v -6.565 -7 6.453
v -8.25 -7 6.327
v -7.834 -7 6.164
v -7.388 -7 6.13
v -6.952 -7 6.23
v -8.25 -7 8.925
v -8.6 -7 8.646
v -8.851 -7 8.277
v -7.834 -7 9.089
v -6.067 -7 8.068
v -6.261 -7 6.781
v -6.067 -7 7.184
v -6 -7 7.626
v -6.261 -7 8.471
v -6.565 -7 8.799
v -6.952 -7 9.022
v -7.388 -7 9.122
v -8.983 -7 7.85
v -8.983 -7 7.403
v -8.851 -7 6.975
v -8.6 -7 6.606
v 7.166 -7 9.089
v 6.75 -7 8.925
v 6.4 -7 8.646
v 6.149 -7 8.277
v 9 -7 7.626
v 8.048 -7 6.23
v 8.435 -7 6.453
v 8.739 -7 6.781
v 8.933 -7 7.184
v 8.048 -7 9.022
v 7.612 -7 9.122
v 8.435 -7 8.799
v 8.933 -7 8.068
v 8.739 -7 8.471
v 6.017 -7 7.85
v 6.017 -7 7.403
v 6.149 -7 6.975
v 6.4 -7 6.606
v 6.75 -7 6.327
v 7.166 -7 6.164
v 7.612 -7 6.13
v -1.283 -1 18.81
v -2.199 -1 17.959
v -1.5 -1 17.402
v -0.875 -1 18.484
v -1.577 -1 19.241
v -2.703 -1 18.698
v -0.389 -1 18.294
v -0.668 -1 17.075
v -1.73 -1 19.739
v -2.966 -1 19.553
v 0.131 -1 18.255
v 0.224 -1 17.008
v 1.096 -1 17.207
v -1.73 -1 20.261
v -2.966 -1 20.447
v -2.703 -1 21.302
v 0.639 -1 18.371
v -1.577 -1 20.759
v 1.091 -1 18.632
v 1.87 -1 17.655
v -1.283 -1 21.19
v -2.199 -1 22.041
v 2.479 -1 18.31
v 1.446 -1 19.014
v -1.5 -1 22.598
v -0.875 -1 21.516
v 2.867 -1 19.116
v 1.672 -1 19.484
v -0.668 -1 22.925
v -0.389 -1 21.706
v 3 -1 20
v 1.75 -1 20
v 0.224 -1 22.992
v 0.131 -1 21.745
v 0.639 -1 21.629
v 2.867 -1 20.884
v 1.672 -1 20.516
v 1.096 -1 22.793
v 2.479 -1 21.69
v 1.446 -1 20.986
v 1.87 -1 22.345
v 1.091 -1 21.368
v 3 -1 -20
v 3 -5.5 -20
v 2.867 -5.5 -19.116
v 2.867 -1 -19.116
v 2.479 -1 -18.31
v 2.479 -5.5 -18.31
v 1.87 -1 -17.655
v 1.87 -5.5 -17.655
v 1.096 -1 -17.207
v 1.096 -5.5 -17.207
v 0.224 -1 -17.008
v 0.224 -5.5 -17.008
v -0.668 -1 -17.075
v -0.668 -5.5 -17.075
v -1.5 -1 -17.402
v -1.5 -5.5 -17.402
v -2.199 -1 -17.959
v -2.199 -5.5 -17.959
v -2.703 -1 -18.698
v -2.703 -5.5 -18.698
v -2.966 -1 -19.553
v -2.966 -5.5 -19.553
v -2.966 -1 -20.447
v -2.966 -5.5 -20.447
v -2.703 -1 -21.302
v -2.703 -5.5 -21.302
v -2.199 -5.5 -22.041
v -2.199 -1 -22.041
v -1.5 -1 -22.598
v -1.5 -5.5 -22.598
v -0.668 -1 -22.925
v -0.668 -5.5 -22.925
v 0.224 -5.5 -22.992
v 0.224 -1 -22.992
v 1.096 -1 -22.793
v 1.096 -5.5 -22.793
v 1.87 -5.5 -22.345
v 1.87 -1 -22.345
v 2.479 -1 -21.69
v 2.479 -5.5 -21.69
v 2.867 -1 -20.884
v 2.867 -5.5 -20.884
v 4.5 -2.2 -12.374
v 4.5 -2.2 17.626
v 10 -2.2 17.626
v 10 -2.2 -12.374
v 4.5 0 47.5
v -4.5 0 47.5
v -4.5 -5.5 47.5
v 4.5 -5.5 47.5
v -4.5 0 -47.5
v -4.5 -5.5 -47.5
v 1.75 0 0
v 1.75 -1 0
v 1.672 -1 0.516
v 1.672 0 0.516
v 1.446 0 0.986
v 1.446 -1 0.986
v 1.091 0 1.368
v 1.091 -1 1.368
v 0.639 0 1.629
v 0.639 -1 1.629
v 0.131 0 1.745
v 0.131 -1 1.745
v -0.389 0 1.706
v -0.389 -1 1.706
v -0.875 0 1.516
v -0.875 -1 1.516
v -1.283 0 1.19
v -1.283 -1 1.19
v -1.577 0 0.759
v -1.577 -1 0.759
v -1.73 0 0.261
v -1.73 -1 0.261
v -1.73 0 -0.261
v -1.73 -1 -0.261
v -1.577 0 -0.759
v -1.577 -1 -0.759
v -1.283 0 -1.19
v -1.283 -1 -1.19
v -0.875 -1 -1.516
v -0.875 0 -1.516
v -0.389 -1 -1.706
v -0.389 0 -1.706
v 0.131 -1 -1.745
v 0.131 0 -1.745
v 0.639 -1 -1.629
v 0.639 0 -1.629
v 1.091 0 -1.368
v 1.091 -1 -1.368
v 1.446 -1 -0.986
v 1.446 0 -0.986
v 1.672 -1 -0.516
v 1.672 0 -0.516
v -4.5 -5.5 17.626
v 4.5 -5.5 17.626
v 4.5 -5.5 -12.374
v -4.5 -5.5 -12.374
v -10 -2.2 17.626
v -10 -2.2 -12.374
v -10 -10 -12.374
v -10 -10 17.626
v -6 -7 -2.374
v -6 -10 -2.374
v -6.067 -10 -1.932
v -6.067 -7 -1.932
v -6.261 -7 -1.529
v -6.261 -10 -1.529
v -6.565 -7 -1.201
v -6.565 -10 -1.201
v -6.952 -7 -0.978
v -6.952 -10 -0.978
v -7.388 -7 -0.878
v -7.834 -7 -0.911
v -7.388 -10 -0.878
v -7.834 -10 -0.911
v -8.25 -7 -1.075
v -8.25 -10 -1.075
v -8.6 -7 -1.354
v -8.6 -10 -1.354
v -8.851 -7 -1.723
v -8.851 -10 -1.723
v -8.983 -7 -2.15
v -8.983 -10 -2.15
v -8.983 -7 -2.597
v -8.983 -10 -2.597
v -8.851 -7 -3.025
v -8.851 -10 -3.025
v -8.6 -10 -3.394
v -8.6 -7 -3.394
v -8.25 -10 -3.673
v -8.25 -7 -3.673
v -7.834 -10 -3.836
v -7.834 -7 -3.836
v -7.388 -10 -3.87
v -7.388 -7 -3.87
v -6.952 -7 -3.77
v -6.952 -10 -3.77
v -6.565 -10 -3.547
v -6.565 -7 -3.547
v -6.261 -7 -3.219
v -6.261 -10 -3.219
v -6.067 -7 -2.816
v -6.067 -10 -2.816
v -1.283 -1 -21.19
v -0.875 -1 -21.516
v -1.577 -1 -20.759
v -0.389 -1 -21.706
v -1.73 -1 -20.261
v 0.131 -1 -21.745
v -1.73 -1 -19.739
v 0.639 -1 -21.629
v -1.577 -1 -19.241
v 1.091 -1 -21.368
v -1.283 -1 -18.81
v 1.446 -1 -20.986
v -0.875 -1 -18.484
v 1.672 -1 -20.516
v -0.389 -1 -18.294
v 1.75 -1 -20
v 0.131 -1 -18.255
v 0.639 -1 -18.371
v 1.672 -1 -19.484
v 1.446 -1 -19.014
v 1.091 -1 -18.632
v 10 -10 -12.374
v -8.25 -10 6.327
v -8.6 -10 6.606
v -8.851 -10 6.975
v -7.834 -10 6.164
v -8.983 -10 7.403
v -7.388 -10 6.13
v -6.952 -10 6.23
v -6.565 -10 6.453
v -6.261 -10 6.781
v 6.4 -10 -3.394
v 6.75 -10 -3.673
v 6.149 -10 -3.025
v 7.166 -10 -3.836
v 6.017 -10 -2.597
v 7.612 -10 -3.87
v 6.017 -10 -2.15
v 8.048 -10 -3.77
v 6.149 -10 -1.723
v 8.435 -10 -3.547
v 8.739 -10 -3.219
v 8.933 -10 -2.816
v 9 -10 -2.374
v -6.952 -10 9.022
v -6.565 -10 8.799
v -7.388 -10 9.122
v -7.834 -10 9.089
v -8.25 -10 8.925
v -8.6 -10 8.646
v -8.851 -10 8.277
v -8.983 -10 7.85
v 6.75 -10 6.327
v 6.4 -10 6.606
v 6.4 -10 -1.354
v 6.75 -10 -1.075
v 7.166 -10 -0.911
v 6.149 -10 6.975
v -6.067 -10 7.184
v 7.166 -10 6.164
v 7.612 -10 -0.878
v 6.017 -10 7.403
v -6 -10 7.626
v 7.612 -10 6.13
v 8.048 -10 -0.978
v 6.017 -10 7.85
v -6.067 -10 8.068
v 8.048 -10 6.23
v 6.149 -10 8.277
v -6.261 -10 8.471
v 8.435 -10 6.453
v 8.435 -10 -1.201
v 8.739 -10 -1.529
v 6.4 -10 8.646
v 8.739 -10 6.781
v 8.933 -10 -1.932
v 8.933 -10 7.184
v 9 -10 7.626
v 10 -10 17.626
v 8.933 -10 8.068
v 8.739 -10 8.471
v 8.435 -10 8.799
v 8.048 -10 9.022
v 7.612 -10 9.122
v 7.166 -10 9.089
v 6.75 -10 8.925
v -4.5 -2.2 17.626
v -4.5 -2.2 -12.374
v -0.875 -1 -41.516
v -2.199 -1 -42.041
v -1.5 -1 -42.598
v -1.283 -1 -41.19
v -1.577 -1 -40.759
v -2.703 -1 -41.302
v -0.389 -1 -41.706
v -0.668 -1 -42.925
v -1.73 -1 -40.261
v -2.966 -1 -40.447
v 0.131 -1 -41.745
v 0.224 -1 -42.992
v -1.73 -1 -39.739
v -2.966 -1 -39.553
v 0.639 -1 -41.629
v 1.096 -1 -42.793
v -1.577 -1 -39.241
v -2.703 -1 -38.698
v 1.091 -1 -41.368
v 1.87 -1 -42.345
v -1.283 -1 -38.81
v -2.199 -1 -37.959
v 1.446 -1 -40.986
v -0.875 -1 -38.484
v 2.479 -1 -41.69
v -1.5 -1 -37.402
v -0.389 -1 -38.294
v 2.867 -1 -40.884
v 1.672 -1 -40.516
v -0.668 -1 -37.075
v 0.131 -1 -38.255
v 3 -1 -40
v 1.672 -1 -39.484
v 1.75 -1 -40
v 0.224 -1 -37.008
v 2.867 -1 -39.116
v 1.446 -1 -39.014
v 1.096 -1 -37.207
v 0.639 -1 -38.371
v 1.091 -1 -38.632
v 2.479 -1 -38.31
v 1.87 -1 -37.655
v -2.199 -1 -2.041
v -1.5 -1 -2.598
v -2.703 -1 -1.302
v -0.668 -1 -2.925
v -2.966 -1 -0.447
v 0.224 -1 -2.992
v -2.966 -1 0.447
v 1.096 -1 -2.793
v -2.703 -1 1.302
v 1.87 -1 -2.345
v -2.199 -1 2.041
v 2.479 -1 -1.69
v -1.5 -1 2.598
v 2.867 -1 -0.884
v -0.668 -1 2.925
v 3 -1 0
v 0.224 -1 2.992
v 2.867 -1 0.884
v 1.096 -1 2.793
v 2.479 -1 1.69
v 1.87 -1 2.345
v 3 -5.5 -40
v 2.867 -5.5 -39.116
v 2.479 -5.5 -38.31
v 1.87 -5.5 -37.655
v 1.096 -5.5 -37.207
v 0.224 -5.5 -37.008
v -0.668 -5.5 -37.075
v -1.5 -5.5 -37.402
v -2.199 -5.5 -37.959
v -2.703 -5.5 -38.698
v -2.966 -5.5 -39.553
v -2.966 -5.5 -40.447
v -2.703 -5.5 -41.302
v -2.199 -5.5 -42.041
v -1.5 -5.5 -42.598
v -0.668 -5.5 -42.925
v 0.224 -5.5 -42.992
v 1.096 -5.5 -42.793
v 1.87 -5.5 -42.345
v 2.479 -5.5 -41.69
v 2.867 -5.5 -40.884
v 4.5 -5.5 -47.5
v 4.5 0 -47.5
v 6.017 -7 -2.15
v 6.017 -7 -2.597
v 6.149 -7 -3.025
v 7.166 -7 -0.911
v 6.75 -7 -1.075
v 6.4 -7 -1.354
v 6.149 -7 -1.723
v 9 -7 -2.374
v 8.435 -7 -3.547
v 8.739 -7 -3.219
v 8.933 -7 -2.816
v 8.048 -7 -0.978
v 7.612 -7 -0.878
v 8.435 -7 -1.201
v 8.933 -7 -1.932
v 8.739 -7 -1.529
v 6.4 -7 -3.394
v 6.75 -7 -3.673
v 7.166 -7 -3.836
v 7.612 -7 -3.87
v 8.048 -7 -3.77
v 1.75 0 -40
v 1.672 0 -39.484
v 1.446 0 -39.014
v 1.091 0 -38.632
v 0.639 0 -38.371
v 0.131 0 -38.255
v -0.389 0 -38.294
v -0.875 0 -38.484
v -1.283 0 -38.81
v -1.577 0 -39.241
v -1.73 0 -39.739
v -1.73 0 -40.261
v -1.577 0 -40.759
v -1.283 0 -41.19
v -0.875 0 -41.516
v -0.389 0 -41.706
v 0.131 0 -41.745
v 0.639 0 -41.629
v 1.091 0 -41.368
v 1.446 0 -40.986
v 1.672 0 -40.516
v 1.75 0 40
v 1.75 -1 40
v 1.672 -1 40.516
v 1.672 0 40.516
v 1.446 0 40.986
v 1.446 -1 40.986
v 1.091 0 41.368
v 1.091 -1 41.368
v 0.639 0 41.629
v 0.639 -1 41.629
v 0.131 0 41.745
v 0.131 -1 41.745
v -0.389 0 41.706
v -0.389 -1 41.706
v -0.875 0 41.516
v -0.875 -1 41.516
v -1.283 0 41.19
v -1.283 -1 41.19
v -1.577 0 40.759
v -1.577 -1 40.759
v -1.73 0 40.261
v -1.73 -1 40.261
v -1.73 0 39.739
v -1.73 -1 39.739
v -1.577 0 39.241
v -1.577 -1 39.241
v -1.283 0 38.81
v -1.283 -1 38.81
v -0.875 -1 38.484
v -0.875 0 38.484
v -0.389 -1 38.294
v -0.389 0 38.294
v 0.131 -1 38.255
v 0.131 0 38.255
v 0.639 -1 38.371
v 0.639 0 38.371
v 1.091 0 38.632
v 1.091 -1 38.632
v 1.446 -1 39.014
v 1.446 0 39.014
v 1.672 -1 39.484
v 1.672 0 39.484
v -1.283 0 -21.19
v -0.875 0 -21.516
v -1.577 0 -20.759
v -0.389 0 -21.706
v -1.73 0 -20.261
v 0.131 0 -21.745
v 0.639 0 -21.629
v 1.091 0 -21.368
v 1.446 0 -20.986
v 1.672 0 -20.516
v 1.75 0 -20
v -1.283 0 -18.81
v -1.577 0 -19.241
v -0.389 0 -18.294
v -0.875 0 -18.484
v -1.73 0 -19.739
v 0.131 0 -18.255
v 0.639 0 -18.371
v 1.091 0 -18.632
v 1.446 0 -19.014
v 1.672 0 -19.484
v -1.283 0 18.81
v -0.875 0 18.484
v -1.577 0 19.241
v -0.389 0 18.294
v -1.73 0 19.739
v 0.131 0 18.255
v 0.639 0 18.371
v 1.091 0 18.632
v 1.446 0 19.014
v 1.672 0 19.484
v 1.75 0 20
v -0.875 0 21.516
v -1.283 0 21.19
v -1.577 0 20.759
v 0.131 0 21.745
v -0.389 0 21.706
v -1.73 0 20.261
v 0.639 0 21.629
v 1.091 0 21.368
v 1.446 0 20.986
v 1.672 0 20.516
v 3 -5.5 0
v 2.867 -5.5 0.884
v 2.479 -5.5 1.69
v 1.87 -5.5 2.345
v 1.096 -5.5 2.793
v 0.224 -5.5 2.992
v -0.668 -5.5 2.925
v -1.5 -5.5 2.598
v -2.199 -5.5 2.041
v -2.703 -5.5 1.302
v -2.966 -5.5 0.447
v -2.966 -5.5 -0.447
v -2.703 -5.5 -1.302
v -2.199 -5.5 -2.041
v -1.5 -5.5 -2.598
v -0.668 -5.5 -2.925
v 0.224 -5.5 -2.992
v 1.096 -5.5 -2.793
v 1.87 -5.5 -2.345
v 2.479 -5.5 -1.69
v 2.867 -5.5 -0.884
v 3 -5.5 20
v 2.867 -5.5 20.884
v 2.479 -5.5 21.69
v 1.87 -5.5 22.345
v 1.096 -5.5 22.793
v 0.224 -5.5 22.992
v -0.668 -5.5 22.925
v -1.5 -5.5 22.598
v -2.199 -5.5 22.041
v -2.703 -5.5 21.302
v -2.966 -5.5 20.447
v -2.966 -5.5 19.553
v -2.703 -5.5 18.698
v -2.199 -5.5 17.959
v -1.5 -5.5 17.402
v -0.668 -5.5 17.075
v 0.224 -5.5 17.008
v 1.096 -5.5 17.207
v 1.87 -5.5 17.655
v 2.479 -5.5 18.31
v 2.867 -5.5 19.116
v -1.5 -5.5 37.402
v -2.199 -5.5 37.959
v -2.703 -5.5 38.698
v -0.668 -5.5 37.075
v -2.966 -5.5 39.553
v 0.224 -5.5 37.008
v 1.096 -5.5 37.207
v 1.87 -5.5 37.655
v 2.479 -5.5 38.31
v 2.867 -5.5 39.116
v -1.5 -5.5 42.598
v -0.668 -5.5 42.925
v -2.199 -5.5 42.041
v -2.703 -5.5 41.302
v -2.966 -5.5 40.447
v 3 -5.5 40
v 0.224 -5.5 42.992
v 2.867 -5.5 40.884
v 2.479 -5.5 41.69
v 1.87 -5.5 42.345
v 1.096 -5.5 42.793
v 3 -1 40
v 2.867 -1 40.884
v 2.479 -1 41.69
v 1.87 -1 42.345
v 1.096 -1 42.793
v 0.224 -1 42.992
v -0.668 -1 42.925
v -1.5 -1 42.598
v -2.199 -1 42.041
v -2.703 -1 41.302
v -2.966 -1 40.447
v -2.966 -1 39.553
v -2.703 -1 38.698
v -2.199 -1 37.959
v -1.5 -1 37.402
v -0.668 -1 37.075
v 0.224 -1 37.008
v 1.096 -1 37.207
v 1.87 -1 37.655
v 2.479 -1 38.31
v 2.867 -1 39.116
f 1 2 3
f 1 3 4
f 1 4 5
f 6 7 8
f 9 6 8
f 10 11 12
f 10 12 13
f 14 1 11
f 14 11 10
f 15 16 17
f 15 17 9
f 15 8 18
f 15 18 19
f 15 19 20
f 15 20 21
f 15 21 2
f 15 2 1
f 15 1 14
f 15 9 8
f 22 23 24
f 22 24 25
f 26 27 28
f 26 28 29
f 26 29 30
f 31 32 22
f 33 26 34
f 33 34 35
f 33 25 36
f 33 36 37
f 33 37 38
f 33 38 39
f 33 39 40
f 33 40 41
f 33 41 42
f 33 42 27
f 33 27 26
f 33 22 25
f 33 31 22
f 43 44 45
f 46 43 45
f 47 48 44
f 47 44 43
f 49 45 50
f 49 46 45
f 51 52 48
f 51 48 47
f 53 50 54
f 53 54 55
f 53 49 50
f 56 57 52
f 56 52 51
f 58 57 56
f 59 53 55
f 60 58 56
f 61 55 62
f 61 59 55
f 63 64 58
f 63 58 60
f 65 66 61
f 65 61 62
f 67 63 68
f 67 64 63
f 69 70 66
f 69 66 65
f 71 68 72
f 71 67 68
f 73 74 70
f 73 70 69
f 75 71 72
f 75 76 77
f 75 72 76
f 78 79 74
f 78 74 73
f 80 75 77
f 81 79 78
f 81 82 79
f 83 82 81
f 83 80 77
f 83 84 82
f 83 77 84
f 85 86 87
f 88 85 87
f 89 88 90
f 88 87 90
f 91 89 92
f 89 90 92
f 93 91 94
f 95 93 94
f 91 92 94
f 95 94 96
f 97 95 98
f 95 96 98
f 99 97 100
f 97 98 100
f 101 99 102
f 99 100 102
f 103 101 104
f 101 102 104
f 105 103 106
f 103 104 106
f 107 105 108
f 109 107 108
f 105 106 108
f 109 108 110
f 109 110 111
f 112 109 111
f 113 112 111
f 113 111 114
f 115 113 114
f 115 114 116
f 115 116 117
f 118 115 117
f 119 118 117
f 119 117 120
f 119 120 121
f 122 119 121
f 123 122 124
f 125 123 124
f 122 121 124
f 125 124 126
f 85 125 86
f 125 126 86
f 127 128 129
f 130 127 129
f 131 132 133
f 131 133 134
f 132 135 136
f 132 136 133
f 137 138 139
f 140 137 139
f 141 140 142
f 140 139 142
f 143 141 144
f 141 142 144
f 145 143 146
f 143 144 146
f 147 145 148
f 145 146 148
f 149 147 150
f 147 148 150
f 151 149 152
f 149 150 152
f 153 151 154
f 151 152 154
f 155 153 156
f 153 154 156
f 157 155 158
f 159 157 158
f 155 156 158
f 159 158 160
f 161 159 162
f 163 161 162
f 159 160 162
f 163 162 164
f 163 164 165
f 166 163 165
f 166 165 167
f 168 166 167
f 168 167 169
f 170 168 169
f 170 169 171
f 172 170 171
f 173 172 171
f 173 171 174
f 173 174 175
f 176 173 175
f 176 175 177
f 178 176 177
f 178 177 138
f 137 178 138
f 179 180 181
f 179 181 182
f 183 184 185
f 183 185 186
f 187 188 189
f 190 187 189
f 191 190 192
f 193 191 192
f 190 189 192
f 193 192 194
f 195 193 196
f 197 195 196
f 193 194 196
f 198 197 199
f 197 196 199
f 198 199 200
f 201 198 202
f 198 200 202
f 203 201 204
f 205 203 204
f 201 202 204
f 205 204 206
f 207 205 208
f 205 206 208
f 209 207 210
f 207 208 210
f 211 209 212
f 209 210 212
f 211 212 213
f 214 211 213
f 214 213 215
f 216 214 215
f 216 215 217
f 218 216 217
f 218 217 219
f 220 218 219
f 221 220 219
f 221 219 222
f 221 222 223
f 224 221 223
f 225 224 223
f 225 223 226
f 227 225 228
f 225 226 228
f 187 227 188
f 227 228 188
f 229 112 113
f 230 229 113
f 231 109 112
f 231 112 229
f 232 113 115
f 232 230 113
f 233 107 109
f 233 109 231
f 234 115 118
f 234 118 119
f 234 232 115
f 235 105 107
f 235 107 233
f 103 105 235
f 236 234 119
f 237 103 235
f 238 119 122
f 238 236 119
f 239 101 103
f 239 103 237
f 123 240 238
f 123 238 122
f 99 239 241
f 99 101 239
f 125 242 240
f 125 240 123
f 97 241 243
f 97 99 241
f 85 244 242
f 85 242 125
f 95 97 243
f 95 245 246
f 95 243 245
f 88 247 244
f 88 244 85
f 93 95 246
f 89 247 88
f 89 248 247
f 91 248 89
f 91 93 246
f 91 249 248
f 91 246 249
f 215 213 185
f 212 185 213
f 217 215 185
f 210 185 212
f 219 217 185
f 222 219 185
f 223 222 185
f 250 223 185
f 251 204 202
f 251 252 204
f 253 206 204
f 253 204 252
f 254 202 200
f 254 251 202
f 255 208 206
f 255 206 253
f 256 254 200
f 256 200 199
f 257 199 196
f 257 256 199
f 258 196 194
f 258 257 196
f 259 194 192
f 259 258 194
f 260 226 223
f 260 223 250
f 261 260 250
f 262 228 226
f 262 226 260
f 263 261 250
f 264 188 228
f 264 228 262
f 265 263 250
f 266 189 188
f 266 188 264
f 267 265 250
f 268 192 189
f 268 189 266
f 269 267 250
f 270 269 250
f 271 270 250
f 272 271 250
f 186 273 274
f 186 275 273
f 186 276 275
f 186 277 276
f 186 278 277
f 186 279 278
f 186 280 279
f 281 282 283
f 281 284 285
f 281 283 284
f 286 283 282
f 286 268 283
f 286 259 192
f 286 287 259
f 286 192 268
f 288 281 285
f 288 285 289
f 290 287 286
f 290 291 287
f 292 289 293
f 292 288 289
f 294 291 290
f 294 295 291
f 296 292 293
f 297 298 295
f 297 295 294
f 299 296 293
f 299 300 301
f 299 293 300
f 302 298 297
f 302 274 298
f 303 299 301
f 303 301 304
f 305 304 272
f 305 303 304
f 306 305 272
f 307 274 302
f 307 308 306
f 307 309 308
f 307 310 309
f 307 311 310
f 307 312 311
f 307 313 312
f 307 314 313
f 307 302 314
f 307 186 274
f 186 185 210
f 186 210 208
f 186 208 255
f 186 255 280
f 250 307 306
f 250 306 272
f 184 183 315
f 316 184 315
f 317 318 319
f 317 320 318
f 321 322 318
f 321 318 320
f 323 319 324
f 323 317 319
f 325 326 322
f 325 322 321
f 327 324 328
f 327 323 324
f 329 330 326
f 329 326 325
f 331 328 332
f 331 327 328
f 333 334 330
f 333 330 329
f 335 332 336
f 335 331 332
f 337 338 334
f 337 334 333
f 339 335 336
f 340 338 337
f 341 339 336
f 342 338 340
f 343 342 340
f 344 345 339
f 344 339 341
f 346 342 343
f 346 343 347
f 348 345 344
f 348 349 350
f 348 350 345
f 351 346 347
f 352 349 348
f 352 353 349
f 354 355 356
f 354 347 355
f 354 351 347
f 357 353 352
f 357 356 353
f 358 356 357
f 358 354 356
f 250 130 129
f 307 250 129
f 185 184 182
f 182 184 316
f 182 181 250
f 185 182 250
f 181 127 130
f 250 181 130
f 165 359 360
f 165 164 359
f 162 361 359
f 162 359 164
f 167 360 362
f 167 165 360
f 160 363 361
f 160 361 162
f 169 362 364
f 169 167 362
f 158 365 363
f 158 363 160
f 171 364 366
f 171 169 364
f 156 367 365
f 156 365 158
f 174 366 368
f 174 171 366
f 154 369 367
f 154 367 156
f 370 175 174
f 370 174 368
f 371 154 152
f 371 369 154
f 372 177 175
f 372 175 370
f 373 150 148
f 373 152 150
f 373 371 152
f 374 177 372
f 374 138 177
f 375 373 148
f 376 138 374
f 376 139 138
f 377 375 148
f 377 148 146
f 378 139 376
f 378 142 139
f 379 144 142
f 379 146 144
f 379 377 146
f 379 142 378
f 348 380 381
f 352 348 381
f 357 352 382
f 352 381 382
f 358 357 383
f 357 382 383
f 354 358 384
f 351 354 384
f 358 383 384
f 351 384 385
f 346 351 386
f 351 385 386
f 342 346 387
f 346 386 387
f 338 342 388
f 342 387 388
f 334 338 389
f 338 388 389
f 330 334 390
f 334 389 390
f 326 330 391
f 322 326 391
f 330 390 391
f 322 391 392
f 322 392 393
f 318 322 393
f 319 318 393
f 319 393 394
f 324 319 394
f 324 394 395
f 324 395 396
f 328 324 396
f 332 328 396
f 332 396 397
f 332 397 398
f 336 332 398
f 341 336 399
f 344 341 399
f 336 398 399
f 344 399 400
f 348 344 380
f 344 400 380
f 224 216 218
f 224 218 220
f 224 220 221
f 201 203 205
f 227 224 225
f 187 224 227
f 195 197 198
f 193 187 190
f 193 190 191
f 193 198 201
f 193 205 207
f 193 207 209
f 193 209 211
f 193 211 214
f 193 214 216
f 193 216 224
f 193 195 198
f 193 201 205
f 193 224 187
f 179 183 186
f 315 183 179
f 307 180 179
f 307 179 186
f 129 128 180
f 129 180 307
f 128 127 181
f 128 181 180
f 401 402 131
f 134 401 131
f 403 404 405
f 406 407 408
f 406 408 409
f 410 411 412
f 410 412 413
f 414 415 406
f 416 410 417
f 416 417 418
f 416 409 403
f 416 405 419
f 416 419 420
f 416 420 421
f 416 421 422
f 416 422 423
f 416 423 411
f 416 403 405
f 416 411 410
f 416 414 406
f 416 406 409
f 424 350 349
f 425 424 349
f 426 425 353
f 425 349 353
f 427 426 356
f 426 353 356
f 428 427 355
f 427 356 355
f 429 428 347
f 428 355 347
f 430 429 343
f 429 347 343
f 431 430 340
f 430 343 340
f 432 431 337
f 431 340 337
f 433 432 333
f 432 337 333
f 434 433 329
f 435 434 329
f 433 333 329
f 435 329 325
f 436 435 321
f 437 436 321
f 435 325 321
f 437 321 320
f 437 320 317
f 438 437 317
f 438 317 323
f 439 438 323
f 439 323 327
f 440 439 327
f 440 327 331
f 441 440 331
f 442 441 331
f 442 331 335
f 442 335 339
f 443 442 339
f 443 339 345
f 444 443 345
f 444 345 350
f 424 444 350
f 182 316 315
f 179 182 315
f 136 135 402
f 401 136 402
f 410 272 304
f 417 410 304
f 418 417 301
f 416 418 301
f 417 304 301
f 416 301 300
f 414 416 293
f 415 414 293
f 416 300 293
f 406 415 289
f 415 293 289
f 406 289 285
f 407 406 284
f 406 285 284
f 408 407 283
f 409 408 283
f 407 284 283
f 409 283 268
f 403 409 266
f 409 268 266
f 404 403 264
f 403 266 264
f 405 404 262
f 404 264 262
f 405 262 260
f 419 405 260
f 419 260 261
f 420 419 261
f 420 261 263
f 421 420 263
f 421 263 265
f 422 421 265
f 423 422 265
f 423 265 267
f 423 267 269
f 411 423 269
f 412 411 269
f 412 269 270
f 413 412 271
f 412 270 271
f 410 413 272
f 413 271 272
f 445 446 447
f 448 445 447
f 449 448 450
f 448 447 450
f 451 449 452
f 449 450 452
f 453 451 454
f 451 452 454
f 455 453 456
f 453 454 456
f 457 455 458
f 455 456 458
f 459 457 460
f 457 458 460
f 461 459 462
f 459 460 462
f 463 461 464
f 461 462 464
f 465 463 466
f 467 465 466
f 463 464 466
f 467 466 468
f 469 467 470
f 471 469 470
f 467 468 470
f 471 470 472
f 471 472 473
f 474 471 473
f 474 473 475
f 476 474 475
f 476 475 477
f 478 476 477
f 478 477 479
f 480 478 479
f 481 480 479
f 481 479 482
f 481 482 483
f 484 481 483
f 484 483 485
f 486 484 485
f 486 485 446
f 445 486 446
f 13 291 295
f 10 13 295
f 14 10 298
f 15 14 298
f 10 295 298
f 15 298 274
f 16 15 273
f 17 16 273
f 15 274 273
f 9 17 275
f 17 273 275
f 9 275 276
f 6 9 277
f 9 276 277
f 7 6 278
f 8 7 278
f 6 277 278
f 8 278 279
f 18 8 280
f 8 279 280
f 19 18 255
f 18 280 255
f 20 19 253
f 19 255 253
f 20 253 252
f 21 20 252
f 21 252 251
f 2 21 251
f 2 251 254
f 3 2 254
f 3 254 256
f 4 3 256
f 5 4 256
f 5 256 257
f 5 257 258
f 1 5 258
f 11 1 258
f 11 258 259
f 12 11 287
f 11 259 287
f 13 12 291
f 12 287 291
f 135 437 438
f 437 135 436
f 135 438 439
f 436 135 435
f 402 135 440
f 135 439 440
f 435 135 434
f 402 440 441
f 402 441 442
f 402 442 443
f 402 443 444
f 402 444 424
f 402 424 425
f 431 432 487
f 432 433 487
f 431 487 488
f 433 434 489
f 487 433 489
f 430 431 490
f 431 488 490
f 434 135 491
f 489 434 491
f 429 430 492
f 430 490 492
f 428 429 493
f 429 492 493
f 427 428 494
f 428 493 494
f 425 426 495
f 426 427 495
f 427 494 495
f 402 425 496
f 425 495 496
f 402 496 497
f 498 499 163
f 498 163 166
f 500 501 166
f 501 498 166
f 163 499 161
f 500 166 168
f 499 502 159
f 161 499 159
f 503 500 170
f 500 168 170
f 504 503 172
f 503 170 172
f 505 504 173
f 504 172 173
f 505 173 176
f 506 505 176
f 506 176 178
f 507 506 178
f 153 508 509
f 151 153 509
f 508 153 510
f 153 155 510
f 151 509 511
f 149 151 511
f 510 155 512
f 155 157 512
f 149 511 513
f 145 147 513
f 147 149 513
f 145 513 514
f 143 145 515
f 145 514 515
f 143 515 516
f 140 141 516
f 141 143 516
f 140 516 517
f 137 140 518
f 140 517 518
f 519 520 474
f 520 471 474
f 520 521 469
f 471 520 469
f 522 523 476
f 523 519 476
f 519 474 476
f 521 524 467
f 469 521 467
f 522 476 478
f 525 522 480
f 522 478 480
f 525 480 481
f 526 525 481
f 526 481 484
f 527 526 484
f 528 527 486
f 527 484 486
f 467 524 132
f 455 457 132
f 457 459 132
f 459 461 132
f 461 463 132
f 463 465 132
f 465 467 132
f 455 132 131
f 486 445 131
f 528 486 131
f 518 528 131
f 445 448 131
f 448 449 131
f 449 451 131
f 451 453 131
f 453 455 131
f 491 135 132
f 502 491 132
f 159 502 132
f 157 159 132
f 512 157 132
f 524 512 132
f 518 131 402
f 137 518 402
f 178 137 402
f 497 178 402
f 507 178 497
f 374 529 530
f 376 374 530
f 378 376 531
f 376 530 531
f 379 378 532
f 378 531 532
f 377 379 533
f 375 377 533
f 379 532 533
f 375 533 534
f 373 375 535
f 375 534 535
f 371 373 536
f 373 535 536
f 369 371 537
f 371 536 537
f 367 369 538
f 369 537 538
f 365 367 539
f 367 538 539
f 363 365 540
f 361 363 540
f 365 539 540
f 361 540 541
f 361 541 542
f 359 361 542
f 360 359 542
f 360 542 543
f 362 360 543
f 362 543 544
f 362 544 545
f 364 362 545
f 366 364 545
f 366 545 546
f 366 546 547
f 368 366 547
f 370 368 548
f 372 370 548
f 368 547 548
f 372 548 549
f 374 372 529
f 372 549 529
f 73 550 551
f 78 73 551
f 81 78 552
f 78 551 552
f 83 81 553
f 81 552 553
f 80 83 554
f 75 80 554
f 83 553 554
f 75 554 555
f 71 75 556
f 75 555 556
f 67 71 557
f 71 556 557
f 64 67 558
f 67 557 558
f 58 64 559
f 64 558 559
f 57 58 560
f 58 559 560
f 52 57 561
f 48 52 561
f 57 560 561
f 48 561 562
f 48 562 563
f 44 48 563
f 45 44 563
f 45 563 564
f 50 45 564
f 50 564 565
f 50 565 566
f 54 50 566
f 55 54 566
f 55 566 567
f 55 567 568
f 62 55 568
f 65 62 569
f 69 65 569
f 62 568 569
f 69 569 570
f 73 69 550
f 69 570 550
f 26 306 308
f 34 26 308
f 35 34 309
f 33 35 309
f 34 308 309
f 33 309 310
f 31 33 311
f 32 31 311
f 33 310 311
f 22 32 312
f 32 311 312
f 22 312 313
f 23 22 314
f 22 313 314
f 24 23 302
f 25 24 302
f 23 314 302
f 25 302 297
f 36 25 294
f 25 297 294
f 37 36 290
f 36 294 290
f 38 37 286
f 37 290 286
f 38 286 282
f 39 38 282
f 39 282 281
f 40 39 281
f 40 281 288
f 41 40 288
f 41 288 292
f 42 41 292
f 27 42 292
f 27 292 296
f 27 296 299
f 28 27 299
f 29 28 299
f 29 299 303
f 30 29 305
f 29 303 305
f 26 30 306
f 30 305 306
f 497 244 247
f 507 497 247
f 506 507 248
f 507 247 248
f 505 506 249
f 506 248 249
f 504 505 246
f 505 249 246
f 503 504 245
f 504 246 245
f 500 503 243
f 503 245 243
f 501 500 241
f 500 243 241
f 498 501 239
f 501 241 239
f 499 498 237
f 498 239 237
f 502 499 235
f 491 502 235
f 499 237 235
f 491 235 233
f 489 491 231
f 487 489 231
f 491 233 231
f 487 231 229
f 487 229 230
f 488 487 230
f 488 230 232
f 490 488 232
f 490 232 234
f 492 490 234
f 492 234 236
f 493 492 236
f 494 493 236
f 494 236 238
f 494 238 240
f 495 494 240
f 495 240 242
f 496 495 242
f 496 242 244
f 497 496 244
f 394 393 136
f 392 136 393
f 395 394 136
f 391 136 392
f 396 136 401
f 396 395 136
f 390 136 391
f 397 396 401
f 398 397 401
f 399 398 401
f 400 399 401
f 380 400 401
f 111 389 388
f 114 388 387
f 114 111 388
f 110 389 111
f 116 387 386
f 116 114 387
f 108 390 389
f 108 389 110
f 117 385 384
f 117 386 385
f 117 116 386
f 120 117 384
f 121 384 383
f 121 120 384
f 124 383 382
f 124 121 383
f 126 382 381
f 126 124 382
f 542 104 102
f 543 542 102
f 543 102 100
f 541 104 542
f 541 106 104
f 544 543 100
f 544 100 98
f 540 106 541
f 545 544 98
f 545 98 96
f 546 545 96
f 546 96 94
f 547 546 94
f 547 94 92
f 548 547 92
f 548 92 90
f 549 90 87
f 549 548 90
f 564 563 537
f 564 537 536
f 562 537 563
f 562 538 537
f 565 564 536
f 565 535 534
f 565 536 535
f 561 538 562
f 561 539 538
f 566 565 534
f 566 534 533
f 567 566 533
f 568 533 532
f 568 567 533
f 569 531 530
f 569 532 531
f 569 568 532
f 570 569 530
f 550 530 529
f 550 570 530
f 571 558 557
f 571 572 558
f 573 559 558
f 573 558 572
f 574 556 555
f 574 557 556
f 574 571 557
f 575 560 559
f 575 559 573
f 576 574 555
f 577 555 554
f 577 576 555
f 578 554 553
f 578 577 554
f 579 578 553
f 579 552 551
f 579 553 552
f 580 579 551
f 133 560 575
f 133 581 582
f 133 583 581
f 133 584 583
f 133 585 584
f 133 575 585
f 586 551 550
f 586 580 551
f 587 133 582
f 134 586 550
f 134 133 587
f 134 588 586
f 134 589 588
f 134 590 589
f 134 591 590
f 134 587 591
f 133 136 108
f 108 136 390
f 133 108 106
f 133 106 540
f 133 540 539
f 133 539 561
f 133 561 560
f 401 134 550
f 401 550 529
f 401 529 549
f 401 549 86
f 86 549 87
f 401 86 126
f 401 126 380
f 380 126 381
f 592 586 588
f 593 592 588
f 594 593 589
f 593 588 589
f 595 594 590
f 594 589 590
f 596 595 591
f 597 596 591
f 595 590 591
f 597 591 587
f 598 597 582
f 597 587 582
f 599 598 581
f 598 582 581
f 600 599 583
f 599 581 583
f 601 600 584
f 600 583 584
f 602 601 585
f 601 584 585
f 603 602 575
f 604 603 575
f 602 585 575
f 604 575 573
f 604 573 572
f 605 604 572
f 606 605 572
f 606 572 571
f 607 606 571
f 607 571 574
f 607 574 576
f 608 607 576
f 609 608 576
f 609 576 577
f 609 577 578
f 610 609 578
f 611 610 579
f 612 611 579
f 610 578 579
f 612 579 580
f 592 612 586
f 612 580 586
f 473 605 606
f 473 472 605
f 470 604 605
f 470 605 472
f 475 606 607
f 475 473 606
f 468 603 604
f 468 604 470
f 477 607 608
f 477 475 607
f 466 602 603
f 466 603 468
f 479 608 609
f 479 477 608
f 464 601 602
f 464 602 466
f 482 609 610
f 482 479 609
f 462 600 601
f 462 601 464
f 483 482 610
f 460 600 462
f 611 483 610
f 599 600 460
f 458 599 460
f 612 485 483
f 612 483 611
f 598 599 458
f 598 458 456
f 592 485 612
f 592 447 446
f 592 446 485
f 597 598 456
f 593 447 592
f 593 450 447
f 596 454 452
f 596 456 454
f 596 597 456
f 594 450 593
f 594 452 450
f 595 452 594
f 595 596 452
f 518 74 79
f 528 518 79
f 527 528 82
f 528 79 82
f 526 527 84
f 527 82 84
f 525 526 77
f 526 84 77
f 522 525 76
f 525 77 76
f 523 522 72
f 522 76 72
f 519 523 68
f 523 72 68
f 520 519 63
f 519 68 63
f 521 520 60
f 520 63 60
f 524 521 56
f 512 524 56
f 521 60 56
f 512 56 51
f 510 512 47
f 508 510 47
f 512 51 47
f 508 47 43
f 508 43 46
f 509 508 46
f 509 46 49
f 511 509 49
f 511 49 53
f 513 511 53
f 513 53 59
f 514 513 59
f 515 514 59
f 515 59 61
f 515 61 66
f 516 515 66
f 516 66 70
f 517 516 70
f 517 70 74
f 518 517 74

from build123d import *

# Parameters (mm, degrees)
F0_W      = 9
F0_H      = 95
F1_DEPTH  = 5.5
F2_R      = 1.75
F3_DEPTH  = 5.501
F2_R_2    = 3
F4_DEPTH  = 4.5
F6_W      = 20
F6_H      = 30
F7_DEPTH  = 7.8
F8_W      = 9
F8_H      = 30
F9_DEPTH  = 3.3
F10_R     = 1.5
F11_DEPTH = 3


with BuildPart() as f1:
    # F0 (on Front) → F1 (new body)
    with BuildSketch(Plane.XZ):
        Rectangle(F0_W, F0_H)
    extrude(amount=F1_DEPTH)

    # F2 (on face) → F3 (cut, through all)
    with BuildSketch(Plane.XZ.offset(5.5)):
        with Locations((0, 20)):
            Circle(F2_R)
        with Locations((0, 40)):
            Circle(F2_R)
        Circle(F2_R)
        with Locations((0, -20)):
            Circle(F2_R)
        with Locations((0, -40)):
            Circle(F2_R)
    extrude(amount=-F3_DEPTH, mode=Mode.SUBTRACT)

    # F2 (on face) → F4 (cut)
    with BuildSketch(Plane.XZ.offset(5.5)):
        with Locations((0, 40)):
            Circle(F2_R_2)
        with Locations((0, 40)):
            Circle(F2_R, mode=Mode.SUBTRACT)
        with Locations((0, 20)):
            Circle(F2_R_2)
        with Locations((0, 20)):
            Circle(F2_R, mode=Mode.SUBTRACT)
        Circle(F2_R_2)
        Circle(F2_R, mode=Mode.SUBTRACT)
        with Locations((0, -20)):
            Circle(F2_R_2)
        with Locations((0, -20)):
            Circle(F2_R, mode=Mode.SUBTRACT)
        with Locations((0, -40)):
            Circle(F2_R_2)
        with Locations((0, -40)):
            Circle(F2_R, mode=Mode.SUBTRACT)
    extrude(amount=-F4_DEPTH, mode=Mode.SUBTRACT)


with BuildPart() as f7:
    # F6 (on offset) → F7 (new body)
    with BuildSketch(Plane.XZ.offset(2.2)):
        with Locations((0, 2.6261353493)):
            Rectangle(F6_W, F6_H)
    extrude(amount=F7_DEPTH)

    # F8 (on face) → F9 (cut, through all)
    with BuildSketch(Plane(origin=(0, -2.2, 0), x_dir=(-1, 0, 0), z_dir=(0, 1, 0))):
        with Locations((0, 2.6261353493)):
            Rectangle(F8_W, F8_H)
    extrude(amount=-F9_DEPTH, mode=Mode.SUBTRACT)

    # F10 (on face) → F11 (cut)
    with BuildSketch(Plane.XZ.offset(10)):
        with Locations((-7.5, 7.6261353493)):
            Circle(F10_R)
        with Locations((7.5, 7.6261353493)):
            Circle(F10_R)
        with Locations((7.5, -2.3738646507)):
            Circle(F10_R)
        with Locations((-7.5, -2.3738646507)):
            Circle(F10_R)
    extrude(amount=-F11_DEPTH, mode=Mode.SUBTRACT)


solid = Compound([f1.part, f7.part])
